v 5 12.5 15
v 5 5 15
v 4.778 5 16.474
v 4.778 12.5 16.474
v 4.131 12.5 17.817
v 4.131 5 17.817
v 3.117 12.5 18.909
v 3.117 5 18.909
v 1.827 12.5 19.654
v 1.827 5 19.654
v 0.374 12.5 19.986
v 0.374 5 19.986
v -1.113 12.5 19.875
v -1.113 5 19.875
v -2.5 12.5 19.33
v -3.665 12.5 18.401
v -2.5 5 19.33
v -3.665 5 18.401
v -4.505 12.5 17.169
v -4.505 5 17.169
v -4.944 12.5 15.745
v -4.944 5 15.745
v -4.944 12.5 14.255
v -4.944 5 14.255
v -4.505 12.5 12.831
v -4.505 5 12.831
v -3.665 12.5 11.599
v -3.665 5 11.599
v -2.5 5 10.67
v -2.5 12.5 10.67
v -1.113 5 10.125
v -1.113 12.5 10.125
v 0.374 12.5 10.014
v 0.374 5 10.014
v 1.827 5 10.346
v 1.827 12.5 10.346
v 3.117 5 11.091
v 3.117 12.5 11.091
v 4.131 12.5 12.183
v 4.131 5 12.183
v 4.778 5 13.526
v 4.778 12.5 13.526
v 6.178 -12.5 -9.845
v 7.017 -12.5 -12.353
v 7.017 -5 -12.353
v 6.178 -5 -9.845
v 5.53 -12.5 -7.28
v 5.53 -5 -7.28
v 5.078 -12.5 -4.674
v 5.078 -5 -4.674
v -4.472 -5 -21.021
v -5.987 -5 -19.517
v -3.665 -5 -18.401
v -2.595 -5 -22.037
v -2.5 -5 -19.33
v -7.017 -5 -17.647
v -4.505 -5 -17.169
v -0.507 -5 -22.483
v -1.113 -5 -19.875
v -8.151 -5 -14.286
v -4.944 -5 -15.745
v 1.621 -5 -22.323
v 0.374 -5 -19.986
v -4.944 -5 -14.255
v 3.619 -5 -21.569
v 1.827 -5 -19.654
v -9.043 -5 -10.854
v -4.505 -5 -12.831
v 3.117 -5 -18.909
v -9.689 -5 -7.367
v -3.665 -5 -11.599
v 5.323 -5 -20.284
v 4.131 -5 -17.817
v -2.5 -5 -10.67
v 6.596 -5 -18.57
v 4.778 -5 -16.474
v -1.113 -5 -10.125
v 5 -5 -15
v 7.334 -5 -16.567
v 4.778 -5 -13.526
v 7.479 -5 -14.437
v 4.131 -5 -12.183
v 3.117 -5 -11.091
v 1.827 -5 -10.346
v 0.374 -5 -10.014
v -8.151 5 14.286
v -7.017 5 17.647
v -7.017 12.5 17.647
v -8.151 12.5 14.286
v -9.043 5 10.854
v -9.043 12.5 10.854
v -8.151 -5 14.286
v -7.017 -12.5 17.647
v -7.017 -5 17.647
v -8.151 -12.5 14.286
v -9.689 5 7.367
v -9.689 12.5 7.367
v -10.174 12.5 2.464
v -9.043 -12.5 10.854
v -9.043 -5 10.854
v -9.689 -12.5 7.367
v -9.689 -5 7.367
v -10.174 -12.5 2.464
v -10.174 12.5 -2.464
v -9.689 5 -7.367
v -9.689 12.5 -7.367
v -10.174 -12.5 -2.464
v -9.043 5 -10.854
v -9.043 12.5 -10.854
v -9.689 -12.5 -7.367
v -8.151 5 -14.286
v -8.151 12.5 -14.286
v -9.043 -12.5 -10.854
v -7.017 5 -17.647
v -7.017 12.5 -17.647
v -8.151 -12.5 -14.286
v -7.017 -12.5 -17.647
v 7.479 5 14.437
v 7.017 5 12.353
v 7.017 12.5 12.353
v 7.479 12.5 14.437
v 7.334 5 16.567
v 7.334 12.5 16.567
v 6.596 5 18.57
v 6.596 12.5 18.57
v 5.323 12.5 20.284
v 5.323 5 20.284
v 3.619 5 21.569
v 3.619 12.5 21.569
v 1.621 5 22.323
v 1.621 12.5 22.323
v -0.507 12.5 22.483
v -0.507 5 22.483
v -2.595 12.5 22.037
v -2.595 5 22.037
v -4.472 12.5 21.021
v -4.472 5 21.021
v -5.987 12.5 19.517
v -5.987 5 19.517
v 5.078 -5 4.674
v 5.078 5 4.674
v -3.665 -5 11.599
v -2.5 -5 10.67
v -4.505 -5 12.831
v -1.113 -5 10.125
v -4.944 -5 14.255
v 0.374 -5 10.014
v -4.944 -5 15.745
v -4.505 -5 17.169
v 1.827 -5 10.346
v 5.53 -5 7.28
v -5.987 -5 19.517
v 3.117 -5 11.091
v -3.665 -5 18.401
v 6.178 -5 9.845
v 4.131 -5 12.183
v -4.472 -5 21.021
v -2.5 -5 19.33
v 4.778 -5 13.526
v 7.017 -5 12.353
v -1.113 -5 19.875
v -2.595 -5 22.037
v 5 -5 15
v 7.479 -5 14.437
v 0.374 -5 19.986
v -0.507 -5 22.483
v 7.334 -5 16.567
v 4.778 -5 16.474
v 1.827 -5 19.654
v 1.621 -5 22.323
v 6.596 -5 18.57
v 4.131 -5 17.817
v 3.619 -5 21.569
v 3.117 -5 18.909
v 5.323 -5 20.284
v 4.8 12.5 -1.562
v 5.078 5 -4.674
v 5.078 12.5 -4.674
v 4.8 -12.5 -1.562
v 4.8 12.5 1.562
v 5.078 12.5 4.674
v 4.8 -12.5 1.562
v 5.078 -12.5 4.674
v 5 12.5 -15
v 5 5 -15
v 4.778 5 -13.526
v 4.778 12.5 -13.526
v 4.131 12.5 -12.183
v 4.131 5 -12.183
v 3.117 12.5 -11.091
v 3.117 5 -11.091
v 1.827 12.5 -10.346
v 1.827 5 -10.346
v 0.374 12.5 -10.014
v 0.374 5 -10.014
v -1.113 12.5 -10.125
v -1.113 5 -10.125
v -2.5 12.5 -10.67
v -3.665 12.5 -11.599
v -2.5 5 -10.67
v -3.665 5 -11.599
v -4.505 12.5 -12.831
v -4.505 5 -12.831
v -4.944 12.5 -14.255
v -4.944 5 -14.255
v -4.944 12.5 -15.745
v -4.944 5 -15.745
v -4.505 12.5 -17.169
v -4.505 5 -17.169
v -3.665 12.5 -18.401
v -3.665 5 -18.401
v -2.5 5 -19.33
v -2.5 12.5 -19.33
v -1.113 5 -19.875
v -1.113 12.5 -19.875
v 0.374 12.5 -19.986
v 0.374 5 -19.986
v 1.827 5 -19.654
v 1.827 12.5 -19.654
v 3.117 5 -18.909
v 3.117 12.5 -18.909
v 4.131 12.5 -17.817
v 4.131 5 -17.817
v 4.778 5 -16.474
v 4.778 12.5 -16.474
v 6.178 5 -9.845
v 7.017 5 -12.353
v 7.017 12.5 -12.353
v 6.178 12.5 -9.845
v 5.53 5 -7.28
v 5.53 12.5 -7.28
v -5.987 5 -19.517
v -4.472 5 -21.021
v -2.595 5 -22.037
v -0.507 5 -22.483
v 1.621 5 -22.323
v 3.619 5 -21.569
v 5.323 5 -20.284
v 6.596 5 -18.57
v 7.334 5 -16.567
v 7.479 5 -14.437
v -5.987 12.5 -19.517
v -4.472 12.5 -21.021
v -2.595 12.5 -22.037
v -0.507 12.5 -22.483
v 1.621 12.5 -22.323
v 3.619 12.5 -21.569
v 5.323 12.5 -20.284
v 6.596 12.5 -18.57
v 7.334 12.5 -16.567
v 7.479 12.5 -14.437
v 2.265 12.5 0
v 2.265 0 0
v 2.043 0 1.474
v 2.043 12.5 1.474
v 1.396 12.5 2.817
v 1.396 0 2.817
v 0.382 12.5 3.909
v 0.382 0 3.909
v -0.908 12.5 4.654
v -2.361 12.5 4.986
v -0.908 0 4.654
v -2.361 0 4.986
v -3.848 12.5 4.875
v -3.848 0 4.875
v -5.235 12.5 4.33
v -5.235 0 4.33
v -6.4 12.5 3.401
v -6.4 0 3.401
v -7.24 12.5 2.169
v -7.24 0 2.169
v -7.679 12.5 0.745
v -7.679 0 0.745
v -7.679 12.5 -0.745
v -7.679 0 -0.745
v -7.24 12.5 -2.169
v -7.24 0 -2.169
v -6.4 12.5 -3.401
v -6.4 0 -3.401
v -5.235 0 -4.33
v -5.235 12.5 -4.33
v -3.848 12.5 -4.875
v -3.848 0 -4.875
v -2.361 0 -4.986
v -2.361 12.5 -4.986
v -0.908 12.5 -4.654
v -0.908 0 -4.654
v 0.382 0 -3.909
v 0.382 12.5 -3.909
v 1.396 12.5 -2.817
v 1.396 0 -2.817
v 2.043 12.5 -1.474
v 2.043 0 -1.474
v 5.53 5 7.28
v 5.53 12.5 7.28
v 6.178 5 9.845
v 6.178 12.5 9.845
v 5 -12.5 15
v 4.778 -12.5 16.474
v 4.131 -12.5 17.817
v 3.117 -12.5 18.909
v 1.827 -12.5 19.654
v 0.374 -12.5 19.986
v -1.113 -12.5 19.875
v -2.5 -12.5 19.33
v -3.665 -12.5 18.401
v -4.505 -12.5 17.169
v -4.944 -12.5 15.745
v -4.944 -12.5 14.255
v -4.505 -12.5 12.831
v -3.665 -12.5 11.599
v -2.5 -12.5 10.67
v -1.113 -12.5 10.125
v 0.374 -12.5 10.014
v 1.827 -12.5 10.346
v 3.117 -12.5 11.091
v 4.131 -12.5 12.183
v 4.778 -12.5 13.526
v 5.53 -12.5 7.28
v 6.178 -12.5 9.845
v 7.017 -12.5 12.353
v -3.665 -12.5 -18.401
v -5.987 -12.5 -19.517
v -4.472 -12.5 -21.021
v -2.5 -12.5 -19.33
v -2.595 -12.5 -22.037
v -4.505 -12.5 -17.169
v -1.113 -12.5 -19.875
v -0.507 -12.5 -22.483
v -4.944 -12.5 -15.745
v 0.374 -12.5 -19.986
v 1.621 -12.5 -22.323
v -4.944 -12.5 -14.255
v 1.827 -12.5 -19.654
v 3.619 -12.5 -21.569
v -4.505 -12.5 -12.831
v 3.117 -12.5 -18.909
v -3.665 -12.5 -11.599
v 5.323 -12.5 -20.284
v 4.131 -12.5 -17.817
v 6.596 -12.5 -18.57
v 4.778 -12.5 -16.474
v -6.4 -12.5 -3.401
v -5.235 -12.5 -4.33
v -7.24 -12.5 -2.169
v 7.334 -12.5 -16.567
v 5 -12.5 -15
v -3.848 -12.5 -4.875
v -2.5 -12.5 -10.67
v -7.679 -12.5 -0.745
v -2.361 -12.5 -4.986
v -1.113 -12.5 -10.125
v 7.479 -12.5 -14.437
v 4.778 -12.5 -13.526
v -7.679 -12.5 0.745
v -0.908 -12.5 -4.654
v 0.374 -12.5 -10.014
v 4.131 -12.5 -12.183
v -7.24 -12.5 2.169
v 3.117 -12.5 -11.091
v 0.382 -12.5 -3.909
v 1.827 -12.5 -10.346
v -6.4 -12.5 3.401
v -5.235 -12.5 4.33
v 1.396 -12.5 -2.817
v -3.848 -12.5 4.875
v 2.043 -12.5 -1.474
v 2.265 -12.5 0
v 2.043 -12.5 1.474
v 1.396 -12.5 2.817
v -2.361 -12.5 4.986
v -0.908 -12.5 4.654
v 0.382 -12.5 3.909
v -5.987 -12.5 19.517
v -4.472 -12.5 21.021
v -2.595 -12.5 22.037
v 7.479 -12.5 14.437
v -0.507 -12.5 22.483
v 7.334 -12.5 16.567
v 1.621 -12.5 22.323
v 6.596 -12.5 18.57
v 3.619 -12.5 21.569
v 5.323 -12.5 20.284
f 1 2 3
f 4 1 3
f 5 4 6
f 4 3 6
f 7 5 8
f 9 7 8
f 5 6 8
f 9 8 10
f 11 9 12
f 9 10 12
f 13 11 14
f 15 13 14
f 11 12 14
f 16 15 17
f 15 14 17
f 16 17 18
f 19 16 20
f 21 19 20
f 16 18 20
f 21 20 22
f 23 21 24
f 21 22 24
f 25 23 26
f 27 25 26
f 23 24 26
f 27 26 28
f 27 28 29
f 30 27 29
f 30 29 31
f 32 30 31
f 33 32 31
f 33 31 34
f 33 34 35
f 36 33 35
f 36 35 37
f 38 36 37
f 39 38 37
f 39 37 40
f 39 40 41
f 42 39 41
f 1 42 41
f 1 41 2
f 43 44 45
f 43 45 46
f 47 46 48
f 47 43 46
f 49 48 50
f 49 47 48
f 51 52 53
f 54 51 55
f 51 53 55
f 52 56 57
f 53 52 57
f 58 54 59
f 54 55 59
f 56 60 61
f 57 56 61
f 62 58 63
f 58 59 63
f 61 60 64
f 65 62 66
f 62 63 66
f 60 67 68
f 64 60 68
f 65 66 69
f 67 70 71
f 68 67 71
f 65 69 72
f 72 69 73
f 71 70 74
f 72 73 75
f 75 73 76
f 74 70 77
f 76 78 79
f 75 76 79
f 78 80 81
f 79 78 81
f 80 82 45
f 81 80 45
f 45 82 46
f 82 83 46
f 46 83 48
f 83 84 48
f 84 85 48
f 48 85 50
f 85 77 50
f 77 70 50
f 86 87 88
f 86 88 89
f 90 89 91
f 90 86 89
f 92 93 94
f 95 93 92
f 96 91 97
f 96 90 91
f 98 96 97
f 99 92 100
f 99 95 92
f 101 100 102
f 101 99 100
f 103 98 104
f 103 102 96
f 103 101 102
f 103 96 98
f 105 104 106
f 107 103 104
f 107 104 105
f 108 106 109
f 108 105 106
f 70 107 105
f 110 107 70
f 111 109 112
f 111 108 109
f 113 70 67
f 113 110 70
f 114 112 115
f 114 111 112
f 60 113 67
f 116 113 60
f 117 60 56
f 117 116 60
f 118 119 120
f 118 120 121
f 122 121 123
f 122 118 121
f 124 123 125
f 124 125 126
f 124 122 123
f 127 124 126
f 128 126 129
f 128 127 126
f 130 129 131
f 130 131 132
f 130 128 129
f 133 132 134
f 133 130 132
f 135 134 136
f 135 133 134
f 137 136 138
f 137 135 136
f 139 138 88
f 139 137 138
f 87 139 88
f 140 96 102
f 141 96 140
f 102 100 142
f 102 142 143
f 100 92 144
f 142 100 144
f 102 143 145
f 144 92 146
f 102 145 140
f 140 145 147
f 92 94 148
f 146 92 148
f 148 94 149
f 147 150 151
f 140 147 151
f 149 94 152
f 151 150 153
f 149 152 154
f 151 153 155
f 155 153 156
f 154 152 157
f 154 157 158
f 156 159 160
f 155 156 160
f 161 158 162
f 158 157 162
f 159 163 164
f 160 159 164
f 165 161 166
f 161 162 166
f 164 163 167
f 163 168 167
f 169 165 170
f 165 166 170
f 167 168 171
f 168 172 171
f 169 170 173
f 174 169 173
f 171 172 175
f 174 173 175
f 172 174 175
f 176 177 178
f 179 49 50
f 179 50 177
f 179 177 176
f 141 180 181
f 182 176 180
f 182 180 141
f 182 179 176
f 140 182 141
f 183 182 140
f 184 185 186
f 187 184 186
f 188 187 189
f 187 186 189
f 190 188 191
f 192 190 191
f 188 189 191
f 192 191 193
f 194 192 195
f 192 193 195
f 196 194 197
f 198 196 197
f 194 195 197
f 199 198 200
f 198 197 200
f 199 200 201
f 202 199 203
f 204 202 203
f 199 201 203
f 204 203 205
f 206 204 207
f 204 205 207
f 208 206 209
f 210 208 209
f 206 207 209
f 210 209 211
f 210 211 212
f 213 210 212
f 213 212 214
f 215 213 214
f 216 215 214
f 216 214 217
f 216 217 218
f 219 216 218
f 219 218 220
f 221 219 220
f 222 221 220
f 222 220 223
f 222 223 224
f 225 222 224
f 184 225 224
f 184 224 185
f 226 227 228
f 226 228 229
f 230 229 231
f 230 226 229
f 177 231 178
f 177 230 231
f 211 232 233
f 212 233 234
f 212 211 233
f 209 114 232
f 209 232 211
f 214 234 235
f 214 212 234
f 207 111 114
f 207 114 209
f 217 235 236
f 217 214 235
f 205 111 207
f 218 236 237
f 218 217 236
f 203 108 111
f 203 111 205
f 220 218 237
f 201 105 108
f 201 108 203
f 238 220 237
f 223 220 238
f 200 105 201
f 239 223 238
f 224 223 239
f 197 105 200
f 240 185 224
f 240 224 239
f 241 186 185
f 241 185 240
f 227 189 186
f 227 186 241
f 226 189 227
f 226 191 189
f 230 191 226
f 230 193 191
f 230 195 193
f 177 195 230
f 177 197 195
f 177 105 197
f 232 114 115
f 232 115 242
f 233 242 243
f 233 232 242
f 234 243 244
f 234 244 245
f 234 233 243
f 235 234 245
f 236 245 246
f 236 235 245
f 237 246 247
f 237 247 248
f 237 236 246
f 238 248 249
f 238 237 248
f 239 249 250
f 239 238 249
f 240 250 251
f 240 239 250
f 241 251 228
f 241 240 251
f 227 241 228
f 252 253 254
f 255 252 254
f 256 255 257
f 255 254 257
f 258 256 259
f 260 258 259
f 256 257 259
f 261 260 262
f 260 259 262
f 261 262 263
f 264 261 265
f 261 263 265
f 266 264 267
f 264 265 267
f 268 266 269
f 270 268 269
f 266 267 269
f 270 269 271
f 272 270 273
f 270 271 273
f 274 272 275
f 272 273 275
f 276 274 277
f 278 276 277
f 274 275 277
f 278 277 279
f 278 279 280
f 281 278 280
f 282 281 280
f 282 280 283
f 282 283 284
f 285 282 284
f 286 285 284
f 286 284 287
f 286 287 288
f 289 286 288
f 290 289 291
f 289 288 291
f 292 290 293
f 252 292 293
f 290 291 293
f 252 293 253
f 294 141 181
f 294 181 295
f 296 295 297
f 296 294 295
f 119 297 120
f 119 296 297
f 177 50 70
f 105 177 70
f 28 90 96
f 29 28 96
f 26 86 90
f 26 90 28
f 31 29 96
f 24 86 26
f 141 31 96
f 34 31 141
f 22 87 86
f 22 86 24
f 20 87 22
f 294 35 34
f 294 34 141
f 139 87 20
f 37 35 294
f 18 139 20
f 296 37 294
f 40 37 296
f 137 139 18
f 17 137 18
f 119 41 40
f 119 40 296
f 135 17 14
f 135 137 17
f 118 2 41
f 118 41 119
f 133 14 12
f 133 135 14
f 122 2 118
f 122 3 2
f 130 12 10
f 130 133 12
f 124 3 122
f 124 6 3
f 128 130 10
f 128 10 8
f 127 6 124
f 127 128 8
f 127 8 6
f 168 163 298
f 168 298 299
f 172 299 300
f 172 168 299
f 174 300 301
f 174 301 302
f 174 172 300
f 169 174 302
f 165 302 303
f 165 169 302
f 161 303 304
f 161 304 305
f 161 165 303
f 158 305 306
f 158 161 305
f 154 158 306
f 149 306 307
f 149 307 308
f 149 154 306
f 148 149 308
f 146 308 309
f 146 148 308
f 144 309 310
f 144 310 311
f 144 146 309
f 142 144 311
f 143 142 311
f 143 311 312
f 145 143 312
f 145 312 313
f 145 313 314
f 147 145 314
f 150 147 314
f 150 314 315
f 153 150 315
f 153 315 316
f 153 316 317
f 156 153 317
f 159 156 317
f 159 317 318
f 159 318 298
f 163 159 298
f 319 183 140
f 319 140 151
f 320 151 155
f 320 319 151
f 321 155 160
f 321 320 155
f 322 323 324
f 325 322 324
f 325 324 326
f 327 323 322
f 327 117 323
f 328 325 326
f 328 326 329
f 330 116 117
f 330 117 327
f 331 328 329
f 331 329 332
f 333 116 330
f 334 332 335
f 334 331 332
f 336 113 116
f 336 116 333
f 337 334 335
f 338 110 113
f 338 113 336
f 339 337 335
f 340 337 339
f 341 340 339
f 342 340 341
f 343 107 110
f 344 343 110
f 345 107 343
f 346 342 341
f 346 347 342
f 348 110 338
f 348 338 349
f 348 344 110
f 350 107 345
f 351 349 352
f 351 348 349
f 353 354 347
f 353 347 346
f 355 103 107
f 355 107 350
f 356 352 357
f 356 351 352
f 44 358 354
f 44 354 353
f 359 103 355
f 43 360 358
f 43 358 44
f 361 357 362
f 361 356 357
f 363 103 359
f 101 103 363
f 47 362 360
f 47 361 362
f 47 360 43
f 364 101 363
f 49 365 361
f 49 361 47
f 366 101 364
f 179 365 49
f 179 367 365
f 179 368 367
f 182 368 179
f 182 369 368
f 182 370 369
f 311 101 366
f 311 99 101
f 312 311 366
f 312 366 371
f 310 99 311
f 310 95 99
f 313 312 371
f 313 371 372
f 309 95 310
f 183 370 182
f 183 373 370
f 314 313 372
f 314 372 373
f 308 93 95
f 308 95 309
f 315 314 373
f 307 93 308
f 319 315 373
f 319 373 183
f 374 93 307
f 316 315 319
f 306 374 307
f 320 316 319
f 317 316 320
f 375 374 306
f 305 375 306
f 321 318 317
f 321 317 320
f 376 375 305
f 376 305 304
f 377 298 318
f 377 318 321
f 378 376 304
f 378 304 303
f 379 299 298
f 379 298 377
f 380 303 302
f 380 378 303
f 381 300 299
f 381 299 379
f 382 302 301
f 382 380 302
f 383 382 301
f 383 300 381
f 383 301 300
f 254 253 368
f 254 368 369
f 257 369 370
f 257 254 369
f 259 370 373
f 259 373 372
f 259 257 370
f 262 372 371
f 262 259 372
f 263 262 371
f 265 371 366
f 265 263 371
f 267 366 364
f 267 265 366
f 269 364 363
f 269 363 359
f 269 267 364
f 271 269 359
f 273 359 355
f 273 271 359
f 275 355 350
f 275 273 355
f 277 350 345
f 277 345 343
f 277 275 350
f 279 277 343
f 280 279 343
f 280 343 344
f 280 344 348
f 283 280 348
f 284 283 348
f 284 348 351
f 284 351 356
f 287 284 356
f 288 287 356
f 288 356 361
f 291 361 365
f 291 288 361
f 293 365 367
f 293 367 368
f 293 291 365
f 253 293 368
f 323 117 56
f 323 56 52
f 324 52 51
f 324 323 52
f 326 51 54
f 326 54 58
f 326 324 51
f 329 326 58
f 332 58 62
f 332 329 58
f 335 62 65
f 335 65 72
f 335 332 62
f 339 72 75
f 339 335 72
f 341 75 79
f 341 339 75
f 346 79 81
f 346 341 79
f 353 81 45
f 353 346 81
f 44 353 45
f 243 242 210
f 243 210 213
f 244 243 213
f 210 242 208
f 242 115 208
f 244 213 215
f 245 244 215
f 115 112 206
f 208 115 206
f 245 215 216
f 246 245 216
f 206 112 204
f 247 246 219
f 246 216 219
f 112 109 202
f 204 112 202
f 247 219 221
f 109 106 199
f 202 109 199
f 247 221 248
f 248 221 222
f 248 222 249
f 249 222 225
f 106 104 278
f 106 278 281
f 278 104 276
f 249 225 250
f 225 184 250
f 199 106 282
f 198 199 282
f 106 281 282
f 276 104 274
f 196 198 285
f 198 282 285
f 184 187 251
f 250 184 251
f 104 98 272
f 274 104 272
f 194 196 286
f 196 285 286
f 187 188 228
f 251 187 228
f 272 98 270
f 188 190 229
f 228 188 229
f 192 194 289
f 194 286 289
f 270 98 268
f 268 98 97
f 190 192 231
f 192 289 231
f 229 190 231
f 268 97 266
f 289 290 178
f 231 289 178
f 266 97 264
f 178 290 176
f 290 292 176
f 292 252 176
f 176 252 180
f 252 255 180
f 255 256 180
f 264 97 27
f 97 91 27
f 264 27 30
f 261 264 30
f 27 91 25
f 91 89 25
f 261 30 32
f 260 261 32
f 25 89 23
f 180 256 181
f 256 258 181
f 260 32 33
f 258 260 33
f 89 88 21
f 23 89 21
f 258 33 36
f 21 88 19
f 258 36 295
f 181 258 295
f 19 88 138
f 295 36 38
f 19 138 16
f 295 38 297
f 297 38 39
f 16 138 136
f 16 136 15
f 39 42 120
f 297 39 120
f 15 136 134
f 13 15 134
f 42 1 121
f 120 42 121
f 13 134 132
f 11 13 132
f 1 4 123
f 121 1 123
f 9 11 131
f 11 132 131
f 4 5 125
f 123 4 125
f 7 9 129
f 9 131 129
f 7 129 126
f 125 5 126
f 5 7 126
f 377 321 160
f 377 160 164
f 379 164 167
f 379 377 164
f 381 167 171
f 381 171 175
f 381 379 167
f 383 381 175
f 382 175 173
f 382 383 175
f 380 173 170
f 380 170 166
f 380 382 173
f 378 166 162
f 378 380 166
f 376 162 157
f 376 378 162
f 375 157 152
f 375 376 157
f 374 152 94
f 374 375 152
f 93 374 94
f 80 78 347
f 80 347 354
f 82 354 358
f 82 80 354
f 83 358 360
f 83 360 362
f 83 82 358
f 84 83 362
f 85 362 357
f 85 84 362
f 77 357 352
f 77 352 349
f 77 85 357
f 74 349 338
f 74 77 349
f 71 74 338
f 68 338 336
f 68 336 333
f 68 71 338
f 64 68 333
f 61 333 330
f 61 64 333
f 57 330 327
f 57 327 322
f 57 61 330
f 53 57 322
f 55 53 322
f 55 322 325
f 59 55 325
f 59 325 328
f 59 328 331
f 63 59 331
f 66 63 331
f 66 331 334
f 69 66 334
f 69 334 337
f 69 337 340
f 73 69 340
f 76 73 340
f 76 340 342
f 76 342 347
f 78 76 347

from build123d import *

# Parameters (mm, degrees)
F0_R     = 5
F1_DEPTH = 12.5
F2_DEPTH = 5


# Not quite as in the source:
# - a feature of the source that left no trace in its solid (it failed there, or was rolled back) is left out


with BuildPart() as f1:
    # F0 (on Front) → F1 (new body, symmetric)
    with BuildSketch(Plane.XZ):
        with BuildLine():
            ThreePointArc((5.0784583206, 4.6742255002), (5.8300100803, 8.5686007088), (7.0173413473, 12.3529411765))
            ThreePointArc((7.0173413473, 12.3529411765), (2.6470588235, 22.0173413473), (-7.0173413473, 17.6470588235))
            ThreePointArc((-7.0173413473, 17.6470588235), (-8.6271086588, 12.5781627487), (-9.6893672694, 7.3669570477))
            Line((-9.6893672694, 7.3669570477), (5.0784583206, 4.6742255002))
        make_face()
        with Locations((0, 15)):
            Circle(F0_R, mode=Mode.SUBTRACT)
        with BuildLine():
            ThreePointArc((5.0784583206, -4.6742255002), (4.7649343015, 0), (5.0784583206, 4.6742255002))
            Line((5.0784583206, 4.6742255002), (-9.6893672694, 7.3669570477))
            ThreePointArc((-9.6893672694, 7.3669570477), (-10.2350656985, 0), (-9.6893672694, -7.3669570477))
            Line((-9.6893672694, -7.3669570477), (5.0784583206, -4.6742255002))
        make_face()
        with Locations((-2.7350656985, 0)):
            Circle(F0_R, mode=Mode.SUBTRACT)
        with BuildLine():
            ThreePointArc((7.0173413473, -12.3529411765), (5.8300100803, -8.5686007088), (5.0784583206, -4.6742255002))
            Line((5.0784583206, -4.6742255002), (-9.6893672694, -7.3669570477))
            ThreePointArc((-9.6893672694, -7.3669570477), (-8.6271086588, -12.5781627487), (-7.0173413473, -17.6470588235))
            ThreePointArc((-7.0173413473, -17.6470588235), (2.6470588235, -22.0173413473), (7.0173413473, -12.3529411765))
        make_face()
        with Locations((0, -15)):
            Circle(F0_R, mode=Mode.SUBTRACT)
    extrude(amount=F1_DEPTH, both=True)

    # F0 (on Front) → F2 (cut, symmetric)
    with BuildSketch(Plane.XZ):
        with BuildLine():
            ThreePointArc((5.0784583206, 4.6742255002), (5.8300100803, 8.5686007088), (7.0173413473, 12.3529411765))
            ThreePointArc((7.0173413473, 12.3529411765), (2.6470588235, 22.0173413473), (-7.0173413473, 17.6470588235))
            ThreePointArc((-7.0173413473, 17.6470588235), (-8.6271086588, 12.5781627487), (-9.6893672694, 7.3669570477))
            Line((-9.6893672694, 7.3669570477), (5.0784583206, 4.6742255002))
        make_face()
        with Locations((0, 15)):
            Circle(F0_R, mode=Mode.SUBTRACT)
        with BuildLine():
            ThreePointArc((7.0173413473, -12.3529411765), (5.8300100803, -8.5686007088), (5.0784583206, -4.6742255002))
            Line((5.0784583206, -4.6742255002), (-9.6893672694, -7.3669570477))
            ThreePointArc((-9.6893672694, -7.3669570477), (-8.6271086588, -12.5781627487), (-7.0173413473, -17.6470588235))
            ThreePointArc((-7.0173413473, -17.6470588235), (2.6470588235, -22.0173413473), (7.0173413473, -12.3529411765))
        make_face()
        with Locations((0, -15)):
            Circle(F0_R, mode=Mode.SUBTRACT)
    extrude(amount=F2_DEPTH, both=True, mode=Mode.SUBTRACT)


solid = f1.part
